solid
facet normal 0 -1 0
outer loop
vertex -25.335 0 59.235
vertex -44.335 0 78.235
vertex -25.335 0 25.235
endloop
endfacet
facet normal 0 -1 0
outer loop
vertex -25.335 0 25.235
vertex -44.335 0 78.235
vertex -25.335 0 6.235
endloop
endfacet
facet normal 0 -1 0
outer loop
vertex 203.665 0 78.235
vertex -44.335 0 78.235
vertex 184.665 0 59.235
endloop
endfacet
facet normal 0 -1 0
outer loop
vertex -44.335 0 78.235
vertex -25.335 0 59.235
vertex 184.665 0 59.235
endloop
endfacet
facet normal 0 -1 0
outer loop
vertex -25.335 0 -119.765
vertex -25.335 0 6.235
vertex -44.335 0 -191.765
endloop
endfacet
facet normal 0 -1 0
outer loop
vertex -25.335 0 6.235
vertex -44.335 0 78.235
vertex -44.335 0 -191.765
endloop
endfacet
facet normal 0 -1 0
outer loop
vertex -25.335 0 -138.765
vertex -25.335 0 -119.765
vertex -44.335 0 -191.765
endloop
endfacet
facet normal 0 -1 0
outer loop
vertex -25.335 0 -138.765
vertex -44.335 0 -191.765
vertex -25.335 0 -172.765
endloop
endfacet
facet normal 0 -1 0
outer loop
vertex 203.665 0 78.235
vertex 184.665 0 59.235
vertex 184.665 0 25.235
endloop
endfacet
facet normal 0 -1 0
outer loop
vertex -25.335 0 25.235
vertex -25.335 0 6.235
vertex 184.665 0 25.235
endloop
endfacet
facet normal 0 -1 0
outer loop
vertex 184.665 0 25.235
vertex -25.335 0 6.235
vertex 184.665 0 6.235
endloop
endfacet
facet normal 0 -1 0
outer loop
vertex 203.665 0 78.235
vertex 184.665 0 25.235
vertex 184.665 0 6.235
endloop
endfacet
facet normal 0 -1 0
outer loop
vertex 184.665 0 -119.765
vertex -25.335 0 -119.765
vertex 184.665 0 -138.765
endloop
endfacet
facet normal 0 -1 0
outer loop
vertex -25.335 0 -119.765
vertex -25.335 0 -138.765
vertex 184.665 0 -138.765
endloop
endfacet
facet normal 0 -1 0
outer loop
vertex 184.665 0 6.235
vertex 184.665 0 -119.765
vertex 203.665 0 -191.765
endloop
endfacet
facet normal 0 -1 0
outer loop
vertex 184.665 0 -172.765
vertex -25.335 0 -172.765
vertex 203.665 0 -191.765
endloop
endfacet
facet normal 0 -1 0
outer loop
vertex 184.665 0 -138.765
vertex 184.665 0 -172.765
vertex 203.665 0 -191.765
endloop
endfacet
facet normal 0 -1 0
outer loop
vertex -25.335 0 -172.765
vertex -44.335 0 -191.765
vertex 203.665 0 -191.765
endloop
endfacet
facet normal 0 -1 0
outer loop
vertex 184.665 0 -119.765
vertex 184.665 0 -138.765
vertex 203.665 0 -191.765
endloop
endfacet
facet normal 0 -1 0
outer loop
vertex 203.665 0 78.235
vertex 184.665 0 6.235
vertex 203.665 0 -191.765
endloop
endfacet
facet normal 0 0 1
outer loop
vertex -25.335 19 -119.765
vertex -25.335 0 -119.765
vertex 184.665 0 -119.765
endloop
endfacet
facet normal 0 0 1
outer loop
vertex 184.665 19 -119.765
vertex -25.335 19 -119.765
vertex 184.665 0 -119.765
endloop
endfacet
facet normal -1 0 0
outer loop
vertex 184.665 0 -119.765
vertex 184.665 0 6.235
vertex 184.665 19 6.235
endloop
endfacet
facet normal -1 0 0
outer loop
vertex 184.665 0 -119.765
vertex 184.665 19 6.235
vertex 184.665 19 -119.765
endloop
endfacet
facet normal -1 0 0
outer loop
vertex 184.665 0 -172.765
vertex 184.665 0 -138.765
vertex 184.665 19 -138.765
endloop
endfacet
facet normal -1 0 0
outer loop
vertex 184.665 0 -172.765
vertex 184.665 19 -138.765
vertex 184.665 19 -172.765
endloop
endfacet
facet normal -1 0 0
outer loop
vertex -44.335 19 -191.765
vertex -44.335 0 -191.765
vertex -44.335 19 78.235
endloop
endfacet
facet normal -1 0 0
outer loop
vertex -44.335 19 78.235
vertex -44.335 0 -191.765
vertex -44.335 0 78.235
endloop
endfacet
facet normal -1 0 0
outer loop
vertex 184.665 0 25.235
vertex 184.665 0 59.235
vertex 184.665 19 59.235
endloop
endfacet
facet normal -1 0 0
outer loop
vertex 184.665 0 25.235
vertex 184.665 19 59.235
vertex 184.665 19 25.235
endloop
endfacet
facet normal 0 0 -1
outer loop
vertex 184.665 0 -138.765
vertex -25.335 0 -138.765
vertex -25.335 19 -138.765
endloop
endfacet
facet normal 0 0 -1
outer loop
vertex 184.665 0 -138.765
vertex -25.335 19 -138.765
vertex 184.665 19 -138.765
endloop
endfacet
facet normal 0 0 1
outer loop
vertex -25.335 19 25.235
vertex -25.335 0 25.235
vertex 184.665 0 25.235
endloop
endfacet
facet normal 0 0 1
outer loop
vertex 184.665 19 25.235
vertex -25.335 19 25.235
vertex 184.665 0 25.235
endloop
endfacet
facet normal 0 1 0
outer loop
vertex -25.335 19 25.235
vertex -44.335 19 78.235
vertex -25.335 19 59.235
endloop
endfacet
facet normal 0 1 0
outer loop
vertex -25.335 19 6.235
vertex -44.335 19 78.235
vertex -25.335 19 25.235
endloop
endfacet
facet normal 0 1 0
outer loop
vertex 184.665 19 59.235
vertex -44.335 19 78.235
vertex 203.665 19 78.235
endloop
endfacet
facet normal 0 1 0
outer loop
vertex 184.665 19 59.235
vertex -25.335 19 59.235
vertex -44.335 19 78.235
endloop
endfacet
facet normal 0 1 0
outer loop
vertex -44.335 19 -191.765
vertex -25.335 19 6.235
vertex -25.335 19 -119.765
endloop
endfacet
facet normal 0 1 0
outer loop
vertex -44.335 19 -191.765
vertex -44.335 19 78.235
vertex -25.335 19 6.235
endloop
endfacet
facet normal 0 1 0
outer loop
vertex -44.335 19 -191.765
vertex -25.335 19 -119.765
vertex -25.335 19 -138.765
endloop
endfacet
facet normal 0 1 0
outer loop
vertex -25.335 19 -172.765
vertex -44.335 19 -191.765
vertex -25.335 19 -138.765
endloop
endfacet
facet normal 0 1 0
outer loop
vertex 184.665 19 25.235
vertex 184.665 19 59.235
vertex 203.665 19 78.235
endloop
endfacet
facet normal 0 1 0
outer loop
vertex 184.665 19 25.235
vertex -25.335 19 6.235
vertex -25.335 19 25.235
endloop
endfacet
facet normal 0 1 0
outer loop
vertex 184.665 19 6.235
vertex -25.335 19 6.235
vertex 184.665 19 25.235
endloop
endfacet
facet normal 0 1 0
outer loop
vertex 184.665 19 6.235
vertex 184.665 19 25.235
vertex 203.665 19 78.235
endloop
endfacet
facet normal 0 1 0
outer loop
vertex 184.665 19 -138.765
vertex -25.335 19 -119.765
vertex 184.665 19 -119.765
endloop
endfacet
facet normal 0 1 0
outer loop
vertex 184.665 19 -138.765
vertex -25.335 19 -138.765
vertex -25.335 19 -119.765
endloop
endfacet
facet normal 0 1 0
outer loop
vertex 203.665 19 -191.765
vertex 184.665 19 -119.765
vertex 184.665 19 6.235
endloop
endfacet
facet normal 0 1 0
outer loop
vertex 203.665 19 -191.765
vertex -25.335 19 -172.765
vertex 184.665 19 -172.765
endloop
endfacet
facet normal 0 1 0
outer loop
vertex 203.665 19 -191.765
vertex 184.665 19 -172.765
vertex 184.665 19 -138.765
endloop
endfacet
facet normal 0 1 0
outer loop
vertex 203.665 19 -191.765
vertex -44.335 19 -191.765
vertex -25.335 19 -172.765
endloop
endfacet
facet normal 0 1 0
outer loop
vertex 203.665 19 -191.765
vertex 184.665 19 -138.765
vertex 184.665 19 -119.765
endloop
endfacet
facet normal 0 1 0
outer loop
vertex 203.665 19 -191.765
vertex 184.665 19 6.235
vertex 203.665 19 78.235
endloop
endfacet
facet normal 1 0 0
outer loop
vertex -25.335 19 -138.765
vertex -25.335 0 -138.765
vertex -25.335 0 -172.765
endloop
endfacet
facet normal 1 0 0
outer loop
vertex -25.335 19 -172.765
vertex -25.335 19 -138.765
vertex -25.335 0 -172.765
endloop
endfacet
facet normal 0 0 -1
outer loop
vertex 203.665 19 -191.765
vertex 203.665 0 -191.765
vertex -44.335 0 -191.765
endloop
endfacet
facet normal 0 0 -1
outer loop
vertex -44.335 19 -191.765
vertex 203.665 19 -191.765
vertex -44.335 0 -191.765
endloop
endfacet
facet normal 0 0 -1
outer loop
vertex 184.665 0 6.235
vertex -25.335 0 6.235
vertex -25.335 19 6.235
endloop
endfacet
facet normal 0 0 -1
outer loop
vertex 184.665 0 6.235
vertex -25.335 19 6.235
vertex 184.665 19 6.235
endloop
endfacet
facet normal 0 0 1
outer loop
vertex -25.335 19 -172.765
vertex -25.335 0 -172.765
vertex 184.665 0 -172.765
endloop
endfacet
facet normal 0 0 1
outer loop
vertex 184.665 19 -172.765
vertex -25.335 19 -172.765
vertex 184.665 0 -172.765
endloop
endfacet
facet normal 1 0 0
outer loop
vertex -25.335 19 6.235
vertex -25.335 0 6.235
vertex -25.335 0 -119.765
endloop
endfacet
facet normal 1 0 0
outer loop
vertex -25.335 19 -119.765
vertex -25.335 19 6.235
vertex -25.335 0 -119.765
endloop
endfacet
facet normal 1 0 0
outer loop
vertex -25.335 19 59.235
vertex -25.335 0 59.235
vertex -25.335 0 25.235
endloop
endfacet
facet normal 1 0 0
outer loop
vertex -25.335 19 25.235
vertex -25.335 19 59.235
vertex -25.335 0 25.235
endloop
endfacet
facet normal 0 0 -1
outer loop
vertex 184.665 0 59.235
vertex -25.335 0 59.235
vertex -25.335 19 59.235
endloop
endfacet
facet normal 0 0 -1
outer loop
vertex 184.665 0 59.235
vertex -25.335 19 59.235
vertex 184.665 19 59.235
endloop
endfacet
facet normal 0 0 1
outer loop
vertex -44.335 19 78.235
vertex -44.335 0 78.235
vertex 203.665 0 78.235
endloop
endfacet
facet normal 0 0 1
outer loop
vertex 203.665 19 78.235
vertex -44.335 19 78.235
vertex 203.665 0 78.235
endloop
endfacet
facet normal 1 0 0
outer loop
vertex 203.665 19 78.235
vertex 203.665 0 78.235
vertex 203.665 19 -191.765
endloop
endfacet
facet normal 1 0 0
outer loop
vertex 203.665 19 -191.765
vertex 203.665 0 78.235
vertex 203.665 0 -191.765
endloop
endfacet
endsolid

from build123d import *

# Parameters (mm, degrees)
SKETCH1_W           = 210
SKETCH1_H           = 34
SKETCH1_H_2         = 126
BOSS_EXTRUDE1_DEPTH = 19


with BuildPart() as part:
    # Sketch1 → Boss-Extrude1 (new body)
    with BuildSketch(Plane(origin=(0, 0, 0), x_dir=(1, 0, 0), z_dir=(0, 1, 0))):
        Polygon((-44.335030595, 191.764705882), (-44.335030595, -78.235294118), (-25.335030595, -78.235294118), (184.664969405, -78.235294118), (203.664969405, -78.235294118), (203.664969405, 191.764705882), (184.664969405, 191.764705882), (-25.335030595, 191.764705882), align=None)
        with Locations((79.664969405, -42.235294118)):
            Rectangle(SKETCH1_W, SKETCH1_H, mode=Mode.SUBTRACT)
        with Locations((79.664969405, 155.764705882)):
            Rectangle(SKETCH1_W, SKETCH1_H, mode=Mode.SUBTRACT)
        with Locations((79.664969405, 56.764705882)):
            Rectangle(SKETCH1_W, SKETCH1_H_2, mode=Mode.SUBTRACT)
    extrude(amount=BOSS_EXTRUDE1_DEPTH)


solid = part.part
